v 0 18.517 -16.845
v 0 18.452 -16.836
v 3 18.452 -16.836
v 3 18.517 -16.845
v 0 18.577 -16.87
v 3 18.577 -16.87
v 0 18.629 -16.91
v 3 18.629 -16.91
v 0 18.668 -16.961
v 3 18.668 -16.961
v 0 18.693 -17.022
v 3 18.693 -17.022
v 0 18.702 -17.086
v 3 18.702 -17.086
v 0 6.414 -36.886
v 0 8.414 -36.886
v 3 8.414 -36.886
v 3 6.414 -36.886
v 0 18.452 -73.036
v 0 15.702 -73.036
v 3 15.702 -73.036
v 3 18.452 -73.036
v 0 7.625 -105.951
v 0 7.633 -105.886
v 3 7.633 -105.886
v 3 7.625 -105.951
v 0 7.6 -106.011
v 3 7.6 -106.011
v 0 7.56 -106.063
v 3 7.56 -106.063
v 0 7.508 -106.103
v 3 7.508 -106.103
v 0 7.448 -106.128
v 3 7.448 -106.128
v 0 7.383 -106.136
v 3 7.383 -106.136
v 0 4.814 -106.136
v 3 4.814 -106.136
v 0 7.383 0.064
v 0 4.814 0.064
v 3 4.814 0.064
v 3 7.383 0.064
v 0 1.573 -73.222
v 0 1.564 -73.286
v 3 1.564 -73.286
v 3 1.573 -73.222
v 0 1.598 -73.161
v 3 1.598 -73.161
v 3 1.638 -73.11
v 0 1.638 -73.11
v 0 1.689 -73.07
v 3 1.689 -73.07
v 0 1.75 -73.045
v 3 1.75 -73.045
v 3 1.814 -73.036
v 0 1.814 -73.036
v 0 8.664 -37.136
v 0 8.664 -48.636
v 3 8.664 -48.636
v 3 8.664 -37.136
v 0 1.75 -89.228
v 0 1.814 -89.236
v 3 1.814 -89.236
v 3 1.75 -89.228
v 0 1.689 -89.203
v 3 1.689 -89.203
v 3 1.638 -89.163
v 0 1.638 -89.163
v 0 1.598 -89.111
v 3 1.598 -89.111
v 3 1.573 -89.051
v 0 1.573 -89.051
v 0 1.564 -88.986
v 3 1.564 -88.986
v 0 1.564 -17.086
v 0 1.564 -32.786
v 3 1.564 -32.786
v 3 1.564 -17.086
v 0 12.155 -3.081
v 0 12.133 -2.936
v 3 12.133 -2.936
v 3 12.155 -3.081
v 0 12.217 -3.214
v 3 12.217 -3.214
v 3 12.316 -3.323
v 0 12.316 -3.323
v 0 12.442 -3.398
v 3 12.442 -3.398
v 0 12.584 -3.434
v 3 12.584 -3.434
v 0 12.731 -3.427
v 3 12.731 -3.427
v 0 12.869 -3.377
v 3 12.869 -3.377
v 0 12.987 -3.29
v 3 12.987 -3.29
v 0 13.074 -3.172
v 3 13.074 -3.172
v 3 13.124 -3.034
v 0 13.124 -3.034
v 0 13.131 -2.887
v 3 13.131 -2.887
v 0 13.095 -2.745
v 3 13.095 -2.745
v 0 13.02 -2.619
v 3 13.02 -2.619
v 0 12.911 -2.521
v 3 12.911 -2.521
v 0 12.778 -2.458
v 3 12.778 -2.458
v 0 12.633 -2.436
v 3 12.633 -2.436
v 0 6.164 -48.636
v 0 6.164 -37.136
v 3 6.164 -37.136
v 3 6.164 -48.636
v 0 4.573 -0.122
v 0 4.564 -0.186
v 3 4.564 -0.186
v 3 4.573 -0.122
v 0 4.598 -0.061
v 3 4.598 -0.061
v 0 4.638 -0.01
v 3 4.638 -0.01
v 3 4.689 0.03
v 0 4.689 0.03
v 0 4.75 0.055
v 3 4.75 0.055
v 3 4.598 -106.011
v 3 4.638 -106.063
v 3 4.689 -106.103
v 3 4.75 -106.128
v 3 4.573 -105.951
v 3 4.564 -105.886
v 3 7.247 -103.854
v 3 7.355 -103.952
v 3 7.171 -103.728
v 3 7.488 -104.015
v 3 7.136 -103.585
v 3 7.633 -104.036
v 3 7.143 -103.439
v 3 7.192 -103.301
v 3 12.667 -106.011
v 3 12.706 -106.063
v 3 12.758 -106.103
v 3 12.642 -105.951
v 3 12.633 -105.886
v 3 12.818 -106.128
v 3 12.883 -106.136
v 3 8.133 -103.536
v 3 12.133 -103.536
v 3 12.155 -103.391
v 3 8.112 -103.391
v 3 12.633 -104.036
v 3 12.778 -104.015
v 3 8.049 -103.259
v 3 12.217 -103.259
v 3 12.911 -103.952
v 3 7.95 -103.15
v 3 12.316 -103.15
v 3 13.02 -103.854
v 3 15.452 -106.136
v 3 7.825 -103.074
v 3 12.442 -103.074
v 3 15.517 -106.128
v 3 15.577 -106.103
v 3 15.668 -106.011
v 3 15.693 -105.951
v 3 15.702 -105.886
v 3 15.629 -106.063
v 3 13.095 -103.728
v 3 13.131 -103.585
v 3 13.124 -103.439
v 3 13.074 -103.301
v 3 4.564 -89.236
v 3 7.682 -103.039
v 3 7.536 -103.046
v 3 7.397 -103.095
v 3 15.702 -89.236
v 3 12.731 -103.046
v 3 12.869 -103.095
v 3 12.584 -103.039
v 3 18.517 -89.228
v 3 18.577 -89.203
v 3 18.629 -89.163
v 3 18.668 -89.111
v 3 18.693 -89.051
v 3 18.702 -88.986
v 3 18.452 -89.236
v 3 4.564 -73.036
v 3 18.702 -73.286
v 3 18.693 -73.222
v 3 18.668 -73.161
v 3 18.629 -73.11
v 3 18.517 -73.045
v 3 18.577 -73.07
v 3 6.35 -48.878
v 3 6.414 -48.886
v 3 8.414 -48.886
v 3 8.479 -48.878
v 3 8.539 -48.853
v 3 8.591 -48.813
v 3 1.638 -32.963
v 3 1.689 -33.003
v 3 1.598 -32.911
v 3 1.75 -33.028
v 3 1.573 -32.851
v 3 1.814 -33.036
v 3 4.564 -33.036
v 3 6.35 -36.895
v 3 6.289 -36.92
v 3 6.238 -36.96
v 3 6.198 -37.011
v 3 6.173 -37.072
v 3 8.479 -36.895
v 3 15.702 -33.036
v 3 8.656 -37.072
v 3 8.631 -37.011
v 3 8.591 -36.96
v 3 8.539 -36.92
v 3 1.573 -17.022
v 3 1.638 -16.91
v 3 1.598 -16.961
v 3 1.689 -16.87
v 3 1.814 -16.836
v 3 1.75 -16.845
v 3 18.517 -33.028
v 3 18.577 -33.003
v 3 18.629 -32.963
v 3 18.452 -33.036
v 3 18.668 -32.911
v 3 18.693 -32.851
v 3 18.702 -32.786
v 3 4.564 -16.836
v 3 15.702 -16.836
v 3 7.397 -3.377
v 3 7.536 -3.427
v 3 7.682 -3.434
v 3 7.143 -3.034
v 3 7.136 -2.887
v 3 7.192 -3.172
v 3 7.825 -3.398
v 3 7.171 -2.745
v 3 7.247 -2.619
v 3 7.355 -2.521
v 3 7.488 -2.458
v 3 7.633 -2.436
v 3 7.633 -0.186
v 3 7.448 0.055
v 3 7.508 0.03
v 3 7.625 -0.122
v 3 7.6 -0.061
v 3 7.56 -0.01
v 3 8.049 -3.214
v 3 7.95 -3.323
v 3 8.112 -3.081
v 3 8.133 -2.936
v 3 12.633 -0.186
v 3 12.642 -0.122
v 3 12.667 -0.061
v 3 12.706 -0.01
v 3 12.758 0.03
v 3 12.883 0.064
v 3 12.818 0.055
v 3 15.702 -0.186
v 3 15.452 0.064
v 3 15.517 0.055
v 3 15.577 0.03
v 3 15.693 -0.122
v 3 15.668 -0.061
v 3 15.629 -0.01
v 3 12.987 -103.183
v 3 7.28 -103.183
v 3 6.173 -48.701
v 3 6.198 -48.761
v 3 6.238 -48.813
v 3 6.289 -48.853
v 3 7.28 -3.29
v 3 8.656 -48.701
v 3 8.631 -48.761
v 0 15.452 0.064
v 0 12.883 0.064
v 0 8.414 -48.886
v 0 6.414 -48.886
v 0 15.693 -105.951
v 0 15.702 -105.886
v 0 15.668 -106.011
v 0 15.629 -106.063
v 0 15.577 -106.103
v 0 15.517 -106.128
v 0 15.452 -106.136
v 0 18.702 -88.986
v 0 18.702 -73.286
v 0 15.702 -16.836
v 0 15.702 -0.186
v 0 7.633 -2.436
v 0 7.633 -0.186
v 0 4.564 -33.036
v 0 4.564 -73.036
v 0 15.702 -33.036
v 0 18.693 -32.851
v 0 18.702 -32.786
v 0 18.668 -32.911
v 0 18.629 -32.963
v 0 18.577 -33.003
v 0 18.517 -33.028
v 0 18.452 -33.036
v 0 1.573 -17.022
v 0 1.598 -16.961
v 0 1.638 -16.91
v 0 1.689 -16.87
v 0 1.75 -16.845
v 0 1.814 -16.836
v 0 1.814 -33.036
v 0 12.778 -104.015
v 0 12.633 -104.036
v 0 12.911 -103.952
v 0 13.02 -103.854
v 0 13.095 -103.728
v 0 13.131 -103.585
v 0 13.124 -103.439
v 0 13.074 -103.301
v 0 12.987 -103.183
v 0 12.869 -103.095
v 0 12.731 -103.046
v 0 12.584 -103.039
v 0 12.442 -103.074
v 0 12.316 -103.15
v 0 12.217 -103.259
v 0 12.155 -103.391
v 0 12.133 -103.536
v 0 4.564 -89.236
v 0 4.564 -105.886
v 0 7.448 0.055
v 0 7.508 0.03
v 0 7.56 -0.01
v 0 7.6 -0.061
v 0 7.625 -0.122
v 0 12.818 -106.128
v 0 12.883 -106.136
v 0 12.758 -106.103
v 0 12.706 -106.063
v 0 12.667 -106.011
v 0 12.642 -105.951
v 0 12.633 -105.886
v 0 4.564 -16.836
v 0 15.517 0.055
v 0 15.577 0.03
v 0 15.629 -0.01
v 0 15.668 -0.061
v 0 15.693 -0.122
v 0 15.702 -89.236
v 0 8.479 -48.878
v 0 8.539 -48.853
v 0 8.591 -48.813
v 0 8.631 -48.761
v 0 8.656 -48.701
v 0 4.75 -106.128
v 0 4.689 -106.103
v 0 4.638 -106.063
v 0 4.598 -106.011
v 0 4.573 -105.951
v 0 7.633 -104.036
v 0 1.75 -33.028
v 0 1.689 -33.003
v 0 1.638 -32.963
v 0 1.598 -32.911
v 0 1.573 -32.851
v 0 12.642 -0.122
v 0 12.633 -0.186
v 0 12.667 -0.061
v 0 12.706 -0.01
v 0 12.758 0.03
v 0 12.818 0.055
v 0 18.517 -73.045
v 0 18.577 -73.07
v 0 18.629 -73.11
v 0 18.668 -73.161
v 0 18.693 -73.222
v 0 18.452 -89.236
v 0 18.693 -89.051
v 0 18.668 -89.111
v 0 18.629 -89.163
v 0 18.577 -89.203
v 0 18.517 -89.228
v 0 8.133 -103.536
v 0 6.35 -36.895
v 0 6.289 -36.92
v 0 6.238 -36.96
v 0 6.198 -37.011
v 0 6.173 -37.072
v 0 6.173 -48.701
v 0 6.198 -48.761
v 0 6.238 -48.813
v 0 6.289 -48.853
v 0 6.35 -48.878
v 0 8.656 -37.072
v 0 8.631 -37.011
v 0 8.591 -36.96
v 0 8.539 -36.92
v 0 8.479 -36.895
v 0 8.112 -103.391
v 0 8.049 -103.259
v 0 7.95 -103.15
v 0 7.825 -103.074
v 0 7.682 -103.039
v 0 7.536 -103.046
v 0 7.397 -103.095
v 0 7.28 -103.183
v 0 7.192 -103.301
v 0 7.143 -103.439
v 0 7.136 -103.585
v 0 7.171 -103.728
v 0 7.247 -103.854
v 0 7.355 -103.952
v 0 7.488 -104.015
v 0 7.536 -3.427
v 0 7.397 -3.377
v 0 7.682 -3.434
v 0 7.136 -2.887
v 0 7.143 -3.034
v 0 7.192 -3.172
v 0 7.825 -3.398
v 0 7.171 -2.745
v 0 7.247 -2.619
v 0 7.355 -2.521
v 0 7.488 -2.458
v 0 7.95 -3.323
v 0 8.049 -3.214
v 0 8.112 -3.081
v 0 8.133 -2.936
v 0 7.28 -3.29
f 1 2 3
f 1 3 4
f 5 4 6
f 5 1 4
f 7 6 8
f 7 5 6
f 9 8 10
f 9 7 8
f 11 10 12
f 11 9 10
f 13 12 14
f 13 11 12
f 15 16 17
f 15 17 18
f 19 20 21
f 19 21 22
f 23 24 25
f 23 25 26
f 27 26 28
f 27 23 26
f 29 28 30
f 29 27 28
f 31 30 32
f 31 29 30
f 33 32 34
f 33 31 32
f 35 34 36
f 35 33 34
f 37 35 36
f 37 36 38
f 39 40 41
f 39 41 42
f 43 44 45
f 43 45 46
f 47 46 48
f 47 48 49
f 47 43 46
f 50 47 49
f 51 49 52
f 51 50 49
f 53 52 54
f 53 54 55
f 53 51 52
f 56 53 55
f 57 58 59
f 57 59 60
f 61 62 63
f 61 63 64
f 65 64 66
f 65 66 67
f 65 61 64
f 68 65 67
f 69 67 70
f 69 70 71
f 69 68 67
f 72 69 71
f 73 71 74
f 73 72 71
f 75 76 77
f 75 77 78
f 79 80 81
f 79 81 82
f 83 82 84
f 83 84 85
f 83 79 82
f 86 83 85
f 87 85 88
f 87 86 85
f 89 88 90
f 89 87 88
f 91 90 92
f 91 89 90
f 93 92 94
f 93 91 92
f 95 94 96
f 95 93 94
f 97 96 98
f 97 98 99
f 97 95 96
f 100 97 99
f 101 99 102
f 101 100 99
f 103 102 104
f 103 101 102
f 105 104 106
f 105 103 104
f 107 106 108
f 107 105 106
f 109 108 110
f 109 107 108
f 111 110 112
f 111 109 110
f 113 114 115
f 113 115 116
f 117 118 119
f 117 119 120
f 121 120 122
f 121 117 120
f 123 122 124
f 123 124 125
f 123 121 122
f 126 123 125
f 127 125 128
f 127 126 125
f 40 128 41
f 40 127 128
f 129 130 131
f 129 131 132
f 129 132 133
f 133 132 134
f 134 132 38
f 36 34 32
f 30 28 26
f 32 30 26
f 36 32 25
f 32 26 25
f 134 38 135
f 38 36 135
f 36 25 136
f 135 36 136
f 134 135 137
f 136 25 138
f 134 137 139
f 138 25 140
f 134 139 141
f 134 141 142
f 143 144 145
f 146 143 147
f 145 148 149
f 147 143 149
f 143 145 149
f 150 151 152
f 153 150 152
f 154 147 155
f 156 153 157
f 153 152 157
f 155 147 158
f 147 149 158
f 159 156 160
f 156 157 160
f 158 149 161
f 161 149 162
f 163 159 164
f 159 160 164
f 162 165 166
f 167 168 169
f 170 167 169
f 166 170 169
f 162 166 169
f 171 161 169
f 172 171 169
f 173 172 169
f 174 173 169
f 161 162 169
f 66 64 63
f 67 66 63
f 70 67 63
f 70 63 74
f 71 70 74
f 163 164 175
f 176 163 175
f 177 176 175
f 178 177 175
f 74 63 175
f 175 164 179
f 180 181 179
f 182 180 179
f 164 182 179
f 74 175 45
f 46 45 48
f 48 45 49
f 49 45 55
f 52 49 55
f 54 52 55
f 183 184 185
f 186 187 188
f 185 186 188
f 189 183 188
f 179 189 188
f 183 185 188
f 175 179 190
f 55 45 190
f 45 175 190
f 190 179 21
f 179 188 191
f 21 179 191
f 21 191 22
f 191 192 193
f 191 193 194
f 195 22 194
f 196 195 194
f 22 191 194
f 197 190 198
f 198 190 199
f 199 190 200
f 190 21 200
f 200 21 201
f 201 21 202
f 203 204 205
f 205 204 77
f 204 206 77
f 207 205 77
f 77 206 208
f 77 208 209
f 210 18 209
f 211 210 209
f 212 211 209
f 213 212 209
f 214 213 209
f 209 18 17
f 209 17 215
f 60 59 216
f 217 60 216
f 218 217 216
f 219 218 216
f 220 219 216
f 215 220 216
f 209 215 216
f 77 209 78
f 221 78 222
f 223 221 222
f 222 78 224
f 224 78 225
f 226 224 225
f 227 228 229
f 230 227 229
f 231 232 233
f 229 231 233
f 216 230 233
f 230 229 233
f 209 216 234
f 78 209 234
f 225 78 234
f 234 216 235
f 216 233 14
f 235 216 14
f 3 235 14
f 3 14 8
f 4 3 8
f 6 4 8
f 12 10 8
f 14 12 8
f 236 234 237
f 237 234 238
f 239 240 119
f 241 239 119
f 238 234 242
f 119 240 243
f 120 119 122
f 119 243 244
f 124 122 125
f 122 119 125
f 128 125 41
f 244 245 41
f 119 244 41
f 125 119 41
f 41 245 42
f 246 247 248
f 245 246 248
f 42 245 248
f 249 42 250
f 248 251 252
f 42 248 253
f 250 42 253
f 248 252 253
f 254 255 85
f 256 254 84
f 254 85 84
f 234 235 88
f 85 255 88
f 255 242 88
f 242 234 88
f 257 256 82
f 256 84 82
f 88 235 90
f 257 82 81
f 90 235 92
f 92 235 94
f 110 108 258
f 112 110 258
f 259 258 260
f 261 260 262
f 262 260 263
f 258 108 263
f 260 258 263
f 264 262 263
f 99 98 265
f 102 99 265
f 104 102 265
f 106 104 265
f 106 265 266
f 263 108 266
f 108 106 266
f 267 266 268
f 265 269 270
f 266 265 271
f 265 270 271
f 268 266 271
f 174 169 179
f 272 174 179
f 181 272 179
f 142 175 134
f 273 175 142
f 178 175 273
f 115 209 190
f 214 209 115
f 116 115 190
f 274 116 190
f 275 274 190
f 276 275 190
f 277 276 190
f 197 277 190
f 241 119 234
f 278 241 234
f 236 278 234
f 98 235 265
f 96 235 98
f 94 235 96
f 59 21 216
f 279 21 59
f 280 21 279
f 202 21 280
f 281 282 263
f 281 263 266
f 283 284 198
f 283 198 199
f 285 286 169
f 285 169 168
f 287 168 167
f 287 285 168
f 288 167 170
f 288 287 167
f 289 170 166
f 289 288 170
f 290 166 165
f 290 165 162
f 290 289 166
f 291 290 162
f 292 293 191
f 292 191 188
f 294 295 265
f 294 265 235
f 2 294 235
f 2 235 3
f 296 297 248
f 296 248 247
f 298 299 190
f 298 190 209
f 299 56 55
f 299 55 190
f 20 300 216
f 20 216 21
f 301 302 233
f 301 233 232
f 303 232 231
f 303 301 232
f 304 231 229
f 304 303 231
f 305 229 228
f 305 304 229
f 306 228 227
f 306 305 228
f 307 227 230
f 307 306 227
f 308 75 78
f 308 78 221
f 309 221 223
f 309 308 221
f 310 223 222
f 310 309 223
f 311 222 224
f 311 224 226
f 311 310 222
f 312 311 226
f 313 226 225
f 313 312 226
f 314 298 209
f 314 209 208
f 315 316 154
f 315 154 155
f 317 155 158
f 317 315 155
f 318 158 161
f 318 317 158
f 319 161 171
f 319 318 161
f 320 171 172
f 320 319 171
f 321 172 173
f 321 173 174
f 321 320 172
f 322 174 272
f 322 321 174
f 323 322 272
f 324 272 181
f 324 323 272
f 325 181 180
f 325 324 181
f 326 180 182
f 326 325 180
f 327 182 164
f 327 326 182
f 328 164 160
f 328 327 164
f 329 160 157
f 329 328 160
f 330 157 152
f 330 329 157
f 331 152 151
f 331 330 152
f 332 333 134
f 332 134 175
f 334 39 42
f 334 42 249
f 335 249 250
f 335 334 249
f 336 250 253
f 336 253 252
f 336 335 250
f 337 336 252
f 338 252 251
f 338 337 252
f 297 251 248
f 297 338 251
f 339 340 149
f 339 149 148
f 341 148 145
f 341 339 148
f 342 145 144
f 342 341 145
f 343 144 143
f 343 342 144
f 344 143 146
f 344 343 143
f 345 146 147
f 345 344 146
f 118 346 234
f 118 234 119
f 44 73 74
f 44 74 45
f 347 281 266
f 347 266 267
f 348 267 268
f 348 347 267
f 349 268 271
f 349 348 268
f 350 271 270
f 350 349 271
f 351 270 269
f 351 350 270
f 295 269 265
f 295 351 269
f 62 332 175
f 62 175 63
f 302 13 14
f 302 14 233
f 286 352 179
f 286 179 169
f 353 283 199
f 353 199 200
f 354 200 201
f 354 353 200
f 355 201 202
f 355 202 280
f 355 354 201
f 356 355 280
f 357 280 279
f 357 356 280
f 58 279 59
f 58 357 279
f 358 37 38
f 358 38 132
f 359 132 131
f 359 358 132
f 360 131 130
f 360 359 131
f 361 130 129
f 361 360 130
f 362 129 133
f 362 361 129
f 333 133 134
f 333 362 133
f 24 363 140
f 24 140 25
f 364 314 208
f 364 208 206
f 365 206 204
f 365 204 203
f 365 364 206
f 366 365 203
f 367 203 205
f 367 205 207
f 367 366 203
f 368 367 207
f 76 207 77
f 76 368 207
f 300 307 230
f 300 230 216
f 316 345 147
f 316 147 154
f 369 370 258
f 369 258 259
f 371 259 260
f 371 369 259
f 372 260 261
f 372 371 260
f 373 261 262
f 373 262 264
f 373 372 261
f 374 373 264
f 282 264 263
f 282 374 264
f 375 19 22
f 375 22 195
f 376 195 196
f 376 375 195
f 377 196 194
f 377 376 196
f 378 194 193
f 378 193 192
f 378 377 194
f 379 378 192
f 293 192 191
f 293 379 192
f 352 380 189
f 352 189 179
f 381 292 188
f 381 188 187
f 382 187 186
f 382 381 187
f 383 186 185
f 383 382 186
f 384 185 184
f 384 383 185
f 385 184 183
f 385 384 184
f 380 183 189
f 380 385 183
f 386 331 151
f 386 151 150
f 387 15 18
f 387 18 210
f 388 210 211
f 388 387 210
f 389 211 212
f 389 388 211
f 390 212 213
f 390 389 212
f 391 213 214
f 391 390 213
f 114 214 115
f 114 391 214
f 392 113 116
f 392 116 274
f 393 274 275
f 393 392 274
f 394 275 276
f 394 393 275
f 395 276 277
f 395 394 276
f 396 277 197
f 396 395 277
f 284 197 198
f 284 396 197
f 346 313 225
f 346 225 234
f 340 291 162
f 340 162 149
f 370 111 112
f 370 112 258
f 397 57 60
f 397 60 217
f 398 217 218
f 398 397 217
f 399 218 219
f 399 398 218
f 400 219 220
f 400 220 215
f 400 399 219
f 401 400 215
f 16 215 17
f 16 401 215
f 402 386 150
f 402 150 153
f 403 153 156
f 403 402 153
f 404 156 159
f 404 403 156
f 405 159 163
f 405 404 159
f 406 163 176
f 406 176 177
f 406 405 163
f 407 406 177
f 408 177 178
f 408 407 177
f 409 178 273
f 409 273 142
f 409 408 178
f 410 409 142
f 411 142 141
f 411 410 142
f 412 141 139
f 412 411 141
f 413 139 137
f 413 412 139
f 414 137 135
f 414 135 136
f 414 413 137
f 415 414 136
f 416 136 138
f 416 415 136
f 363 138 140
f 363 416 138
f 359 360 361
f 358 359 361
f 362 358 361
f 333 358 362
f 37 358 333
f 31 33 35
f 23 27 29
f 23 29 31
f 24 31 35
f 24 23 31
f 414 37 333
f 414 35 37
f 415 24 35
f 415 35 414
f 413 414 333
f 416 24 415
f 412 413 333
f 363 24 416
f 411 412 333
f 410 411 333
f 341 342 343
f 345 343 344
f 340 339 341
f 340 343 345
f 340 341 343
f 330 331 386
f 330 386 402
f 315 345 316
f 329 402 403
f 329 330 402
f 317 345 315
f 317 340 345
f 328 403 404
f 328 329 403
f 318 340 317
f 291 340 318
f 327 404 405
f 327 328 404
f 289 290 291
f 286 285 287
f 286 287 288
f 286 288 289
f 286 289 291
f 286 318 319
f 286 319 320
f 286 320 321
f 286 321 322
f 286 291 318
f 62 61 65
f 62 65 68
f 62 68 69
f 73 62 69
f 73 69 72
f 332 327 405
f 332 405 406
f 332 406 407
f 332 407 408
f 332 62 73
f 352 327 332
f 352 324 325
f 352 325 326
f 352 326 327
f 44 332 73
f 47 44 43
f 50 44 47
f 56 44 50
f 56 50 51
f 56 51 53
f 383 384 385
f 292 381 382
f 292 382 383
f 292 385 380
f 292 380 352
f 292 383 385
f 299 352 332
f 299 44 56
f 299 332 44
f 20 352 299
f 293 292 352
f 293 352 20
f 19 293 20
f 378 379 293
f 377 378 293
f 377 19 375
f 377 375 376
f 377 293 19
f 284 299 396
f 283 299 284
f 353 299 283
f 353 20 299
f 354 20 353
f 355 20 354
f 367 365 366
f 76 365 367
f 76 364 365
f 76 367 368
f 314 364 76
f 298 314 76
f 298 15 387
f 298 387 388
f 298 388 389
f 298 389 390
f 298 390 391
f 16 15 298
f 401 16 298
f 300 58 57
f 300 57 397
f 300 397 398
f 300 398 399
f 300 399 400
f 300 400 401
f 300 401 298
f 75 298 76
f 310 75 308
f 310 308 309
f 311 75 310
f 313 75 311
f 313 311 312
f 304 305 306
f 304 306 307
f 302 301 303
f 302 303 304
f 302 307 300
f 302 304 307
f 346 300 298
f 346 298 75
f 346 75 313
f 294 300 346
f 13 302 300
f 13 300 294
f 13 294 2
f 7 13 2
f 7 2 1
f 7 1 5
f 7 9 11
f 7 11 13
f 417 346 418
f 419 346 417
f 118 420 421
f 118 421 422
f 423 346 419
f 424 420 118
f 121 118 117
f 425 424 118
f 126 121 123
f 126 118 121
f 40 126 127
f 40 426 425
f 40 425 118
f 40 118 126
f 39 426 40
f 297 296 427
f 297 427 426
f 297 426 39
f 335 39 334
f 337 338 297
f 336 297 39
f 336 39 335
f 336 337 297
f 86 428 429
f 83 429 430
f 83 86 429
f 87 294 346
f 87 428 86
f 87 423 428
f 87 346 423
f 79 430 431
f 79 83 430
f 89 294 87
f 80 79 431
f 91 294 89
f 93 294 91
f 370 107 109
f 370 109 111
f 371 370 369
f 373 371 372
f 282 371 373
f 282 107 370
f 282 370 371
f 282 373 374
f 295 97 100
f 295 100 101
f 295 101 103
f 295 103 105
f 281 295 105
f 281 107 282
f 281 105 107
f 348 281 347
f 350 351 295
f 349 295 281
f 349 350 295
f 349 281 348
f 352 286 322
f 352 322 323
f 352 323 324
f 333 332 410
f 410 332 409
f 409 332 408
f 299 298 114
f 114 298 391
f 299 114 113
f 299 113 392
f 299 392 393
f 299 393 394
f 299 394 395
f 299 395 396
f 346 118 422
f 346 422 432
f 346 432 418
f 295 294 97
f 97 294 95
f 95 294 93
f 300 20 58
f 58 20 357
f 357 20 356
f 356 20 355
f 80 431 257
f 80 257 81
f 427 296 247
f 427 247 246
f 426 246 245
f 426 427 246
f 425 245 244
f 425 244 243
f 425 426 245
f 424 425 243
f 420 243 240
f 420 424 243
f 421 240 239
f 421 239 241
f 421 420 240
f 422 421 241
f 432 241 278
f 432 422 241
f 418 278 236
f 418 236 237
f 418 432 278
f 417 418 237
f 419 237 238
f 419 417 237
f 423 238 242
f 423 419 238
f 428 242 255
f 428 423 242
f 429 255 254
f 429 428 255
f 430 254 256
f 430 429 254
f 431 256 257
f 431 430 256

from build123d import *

# Parameters (mm, degrees)
BOSS_EXTRUDE1_DEPTH = 3


with BuildPart() as part:
    # Sketch3 → Boss-Extrude1 (new body)
    with BuildSketch(Plane(origin=(0, 0, 0), x_dir=(0, 0, -1), z_dir=(1, 0, 0))):
        with BuildLine():
            Line((73.286325357, 18.701934502), (88.986325357, 18.701934502))
            ThreePointArc((88.986325357, 18.701934502), (89.163102052, 18.628711197), (89.236325357, 18.451934502))
            Line((89.236325357, 18.451934502), (89.236325357, 15.701934502))
            Line((89.236325357, 15.701934502), (105.886325357, 15.701934502))
            ThreePointArc((105.886325357, 15.701934502), (106.063102052, 15.628711197), (106.136325357, 15.451934502))
            Line((106.136325357, 15.451934502), (106.136325357, 12.883184502))
            ThreePointArc((106.136325357, 12.883184502), (106.063102052, 12.706407807), (105.886325357, 12.633184502))
            Line((105.886325357, 12.633184502), (104.036325357, 12.633184502))
            ThreePointArc((104.036325357, 12.633184502), (103.182771966, 12.986737893), (103.536325357, 12.133184502))
            Line((103.536325357, 12.133184502), (103.536325357, 8.133184502))
            ThreePointArc((103.536325357, 8.133184502), (103.182771966, 7.279631112), (104.036325357, 7.633184502))
            Line((104.036325357, 7.633184502), (105.886325357, 7.633184502))
            ThreePointArc((105.886325357, 7.633184502), (106.063102052, 7.559961197), (106.136325357, 7.383184502))
            Line((106.136325357, 7.383184502), (106.136325357, 4.814434502))
            ThreePointArc((106.136325357, 4.814434502), (106.063102052, 4.637657807), (105.886325357, 4.564434502))
            Line((105.886325357, 4.564434502), (89.236325357, 4.564434502))
            Line((89.236325357, 4.564434502), (89.236325357, 1.814434502))
            ThreePointArc((89.236325357, 1.814434502), (89.163102052, 1.637657807), (88.986325357, 1.564434502))
            Line((88.986325357, 1.564434502), (73.286325357, 1.564434502))
            ThreePointArc((73.286325357, 1.564434502), (73.109548661, 1.637657807), (73.036325357, 1.814434502))
            Line((73.036325357, 1.814434502), (73.036325357, 4.564434502))
            Line((73.036325357, 4.564434502), (33.036325357, 4.564434502))
            Line((33.036325357, 4.564434502), (33.036325357, 1.814434502))
            ThreePointArc((33.036325357, 1.814434502), (32.963102052, 1.637657807), (32.786325357, 1.564434502))
            Line((32.786325357, 1.564434502), (17.086325357, 1.564434502))
            ThreePointArc((17.086325357, 1.564434502), (16.909548661, 1.637657807), (16.836325357, 1.814434502))
            Line((16.836325357, 1.814434502), (16.836325357, 4.564434502))
            Line((16.836325357, 4.564434502), (0.186325357, 4.564434502))
            ThreePointArc((0.186325357, 4.564434502), (0.009548661, 4.637657807), (-0.063674643, 4.814434502))
            Line((-0.063674643, 4.814434502), (-0.063674643, 7.383184502))
            ThreePointArc((-0.063674643, 7.383184502), (0.009548661, 7.559961197), (0.186325357, 7.633184502))
            Line((0.186325357, 7.633184502), (2.436325357, 7.633184502))
            ThreePointArc((2.436325357, 7.633184502), (3.289878747, 7.279631112), (2.936325357, 8.133184502))
            Line((2.936325357, 8.133184502), (2.936325357, 12.133184502))
            ThreePointArc((2.936325357, 12.133184502), (3.289878747, 12.986737893), (2.436325357, 12.633184502))
            Line((2.436325357, 12.633184502), (0.186325357, 12.633184502))
            ThreePointArc((0.186325357, 12.633184502), (0.009548661, 12.706407807), (-0.063674643, 12.883184502))
            Line((-0.063674643, 12.883184502), (-0.063674643, 15.451934502))
            ThreePointArc((-0.063674643, 15.451934502), (0.009548661, 15.628711197), (0.186325357, 15.701934502))
            Line((0.186325357, 15.701934502), (16.836325357, 15.701934502))
            Line((16.836325357, 15.701934502), (16.836325357, 18.451934502))
            ThreePointArc((16.836325357, 18.451934502), (16.909548661, 18.628711197), (17.086325357, 18.701934502))
            Line((17.086325357, 18.701934502), (32.786325357, 18.701934502))
            ThreePointArc((32.786325357, 18.701934502), (32.963102052, 18.628711197), (33.036325357, 18.451934502))
            Line((33.036325357, 18.451934502), (33.036325357, 15.701934502))
            Line((33.036325357, 15.701934502), (73.036325357, 15.701934502))
            Line((73.036325357, 15.701934502), (73.036325357, 18.451934502))
            ThreePointArc((73.036325357, 18.451934502), (73.109548661, 18.628711197), (73.286325357, 18.701934502))
        make_face()
        with BuildLine():
            Line((37.136325357, 6.164434502), (48.636325357, 6.164434502))
            ThreePointArc((48.636325357, 6.164434502), (48.813102052, 6.237657807), (48.886325357, 6.414434502))
            Line((48.886325357, 6.414434502), (48.886325357, 8.414434502))
            ThreePointArc((48.886325357, 8.414434502), (48.813102052, 8.591211197), (48.636325357, 8.664434502))
            Line((48.636325357, 8.664434502), (37.136325357, 8.664434502))
            ThreePointArc((37.136325357, 8.664434502), (36.959548661, 8.591211197), (36.886325357, 8.414434502))
            Line((36.886325357, 8.414434502), (36.886325357, 6.414434502))
            ThreePointArc((36.886325357, 6.414434502), (36.959548661, 6.237657807), (37.136325357, 6.164434502))
        make_face(mode=Mode.SUBTRACT)
    extrude(amount=BOSS_EXTRUDE1_DEPTH)


solid = part.part
